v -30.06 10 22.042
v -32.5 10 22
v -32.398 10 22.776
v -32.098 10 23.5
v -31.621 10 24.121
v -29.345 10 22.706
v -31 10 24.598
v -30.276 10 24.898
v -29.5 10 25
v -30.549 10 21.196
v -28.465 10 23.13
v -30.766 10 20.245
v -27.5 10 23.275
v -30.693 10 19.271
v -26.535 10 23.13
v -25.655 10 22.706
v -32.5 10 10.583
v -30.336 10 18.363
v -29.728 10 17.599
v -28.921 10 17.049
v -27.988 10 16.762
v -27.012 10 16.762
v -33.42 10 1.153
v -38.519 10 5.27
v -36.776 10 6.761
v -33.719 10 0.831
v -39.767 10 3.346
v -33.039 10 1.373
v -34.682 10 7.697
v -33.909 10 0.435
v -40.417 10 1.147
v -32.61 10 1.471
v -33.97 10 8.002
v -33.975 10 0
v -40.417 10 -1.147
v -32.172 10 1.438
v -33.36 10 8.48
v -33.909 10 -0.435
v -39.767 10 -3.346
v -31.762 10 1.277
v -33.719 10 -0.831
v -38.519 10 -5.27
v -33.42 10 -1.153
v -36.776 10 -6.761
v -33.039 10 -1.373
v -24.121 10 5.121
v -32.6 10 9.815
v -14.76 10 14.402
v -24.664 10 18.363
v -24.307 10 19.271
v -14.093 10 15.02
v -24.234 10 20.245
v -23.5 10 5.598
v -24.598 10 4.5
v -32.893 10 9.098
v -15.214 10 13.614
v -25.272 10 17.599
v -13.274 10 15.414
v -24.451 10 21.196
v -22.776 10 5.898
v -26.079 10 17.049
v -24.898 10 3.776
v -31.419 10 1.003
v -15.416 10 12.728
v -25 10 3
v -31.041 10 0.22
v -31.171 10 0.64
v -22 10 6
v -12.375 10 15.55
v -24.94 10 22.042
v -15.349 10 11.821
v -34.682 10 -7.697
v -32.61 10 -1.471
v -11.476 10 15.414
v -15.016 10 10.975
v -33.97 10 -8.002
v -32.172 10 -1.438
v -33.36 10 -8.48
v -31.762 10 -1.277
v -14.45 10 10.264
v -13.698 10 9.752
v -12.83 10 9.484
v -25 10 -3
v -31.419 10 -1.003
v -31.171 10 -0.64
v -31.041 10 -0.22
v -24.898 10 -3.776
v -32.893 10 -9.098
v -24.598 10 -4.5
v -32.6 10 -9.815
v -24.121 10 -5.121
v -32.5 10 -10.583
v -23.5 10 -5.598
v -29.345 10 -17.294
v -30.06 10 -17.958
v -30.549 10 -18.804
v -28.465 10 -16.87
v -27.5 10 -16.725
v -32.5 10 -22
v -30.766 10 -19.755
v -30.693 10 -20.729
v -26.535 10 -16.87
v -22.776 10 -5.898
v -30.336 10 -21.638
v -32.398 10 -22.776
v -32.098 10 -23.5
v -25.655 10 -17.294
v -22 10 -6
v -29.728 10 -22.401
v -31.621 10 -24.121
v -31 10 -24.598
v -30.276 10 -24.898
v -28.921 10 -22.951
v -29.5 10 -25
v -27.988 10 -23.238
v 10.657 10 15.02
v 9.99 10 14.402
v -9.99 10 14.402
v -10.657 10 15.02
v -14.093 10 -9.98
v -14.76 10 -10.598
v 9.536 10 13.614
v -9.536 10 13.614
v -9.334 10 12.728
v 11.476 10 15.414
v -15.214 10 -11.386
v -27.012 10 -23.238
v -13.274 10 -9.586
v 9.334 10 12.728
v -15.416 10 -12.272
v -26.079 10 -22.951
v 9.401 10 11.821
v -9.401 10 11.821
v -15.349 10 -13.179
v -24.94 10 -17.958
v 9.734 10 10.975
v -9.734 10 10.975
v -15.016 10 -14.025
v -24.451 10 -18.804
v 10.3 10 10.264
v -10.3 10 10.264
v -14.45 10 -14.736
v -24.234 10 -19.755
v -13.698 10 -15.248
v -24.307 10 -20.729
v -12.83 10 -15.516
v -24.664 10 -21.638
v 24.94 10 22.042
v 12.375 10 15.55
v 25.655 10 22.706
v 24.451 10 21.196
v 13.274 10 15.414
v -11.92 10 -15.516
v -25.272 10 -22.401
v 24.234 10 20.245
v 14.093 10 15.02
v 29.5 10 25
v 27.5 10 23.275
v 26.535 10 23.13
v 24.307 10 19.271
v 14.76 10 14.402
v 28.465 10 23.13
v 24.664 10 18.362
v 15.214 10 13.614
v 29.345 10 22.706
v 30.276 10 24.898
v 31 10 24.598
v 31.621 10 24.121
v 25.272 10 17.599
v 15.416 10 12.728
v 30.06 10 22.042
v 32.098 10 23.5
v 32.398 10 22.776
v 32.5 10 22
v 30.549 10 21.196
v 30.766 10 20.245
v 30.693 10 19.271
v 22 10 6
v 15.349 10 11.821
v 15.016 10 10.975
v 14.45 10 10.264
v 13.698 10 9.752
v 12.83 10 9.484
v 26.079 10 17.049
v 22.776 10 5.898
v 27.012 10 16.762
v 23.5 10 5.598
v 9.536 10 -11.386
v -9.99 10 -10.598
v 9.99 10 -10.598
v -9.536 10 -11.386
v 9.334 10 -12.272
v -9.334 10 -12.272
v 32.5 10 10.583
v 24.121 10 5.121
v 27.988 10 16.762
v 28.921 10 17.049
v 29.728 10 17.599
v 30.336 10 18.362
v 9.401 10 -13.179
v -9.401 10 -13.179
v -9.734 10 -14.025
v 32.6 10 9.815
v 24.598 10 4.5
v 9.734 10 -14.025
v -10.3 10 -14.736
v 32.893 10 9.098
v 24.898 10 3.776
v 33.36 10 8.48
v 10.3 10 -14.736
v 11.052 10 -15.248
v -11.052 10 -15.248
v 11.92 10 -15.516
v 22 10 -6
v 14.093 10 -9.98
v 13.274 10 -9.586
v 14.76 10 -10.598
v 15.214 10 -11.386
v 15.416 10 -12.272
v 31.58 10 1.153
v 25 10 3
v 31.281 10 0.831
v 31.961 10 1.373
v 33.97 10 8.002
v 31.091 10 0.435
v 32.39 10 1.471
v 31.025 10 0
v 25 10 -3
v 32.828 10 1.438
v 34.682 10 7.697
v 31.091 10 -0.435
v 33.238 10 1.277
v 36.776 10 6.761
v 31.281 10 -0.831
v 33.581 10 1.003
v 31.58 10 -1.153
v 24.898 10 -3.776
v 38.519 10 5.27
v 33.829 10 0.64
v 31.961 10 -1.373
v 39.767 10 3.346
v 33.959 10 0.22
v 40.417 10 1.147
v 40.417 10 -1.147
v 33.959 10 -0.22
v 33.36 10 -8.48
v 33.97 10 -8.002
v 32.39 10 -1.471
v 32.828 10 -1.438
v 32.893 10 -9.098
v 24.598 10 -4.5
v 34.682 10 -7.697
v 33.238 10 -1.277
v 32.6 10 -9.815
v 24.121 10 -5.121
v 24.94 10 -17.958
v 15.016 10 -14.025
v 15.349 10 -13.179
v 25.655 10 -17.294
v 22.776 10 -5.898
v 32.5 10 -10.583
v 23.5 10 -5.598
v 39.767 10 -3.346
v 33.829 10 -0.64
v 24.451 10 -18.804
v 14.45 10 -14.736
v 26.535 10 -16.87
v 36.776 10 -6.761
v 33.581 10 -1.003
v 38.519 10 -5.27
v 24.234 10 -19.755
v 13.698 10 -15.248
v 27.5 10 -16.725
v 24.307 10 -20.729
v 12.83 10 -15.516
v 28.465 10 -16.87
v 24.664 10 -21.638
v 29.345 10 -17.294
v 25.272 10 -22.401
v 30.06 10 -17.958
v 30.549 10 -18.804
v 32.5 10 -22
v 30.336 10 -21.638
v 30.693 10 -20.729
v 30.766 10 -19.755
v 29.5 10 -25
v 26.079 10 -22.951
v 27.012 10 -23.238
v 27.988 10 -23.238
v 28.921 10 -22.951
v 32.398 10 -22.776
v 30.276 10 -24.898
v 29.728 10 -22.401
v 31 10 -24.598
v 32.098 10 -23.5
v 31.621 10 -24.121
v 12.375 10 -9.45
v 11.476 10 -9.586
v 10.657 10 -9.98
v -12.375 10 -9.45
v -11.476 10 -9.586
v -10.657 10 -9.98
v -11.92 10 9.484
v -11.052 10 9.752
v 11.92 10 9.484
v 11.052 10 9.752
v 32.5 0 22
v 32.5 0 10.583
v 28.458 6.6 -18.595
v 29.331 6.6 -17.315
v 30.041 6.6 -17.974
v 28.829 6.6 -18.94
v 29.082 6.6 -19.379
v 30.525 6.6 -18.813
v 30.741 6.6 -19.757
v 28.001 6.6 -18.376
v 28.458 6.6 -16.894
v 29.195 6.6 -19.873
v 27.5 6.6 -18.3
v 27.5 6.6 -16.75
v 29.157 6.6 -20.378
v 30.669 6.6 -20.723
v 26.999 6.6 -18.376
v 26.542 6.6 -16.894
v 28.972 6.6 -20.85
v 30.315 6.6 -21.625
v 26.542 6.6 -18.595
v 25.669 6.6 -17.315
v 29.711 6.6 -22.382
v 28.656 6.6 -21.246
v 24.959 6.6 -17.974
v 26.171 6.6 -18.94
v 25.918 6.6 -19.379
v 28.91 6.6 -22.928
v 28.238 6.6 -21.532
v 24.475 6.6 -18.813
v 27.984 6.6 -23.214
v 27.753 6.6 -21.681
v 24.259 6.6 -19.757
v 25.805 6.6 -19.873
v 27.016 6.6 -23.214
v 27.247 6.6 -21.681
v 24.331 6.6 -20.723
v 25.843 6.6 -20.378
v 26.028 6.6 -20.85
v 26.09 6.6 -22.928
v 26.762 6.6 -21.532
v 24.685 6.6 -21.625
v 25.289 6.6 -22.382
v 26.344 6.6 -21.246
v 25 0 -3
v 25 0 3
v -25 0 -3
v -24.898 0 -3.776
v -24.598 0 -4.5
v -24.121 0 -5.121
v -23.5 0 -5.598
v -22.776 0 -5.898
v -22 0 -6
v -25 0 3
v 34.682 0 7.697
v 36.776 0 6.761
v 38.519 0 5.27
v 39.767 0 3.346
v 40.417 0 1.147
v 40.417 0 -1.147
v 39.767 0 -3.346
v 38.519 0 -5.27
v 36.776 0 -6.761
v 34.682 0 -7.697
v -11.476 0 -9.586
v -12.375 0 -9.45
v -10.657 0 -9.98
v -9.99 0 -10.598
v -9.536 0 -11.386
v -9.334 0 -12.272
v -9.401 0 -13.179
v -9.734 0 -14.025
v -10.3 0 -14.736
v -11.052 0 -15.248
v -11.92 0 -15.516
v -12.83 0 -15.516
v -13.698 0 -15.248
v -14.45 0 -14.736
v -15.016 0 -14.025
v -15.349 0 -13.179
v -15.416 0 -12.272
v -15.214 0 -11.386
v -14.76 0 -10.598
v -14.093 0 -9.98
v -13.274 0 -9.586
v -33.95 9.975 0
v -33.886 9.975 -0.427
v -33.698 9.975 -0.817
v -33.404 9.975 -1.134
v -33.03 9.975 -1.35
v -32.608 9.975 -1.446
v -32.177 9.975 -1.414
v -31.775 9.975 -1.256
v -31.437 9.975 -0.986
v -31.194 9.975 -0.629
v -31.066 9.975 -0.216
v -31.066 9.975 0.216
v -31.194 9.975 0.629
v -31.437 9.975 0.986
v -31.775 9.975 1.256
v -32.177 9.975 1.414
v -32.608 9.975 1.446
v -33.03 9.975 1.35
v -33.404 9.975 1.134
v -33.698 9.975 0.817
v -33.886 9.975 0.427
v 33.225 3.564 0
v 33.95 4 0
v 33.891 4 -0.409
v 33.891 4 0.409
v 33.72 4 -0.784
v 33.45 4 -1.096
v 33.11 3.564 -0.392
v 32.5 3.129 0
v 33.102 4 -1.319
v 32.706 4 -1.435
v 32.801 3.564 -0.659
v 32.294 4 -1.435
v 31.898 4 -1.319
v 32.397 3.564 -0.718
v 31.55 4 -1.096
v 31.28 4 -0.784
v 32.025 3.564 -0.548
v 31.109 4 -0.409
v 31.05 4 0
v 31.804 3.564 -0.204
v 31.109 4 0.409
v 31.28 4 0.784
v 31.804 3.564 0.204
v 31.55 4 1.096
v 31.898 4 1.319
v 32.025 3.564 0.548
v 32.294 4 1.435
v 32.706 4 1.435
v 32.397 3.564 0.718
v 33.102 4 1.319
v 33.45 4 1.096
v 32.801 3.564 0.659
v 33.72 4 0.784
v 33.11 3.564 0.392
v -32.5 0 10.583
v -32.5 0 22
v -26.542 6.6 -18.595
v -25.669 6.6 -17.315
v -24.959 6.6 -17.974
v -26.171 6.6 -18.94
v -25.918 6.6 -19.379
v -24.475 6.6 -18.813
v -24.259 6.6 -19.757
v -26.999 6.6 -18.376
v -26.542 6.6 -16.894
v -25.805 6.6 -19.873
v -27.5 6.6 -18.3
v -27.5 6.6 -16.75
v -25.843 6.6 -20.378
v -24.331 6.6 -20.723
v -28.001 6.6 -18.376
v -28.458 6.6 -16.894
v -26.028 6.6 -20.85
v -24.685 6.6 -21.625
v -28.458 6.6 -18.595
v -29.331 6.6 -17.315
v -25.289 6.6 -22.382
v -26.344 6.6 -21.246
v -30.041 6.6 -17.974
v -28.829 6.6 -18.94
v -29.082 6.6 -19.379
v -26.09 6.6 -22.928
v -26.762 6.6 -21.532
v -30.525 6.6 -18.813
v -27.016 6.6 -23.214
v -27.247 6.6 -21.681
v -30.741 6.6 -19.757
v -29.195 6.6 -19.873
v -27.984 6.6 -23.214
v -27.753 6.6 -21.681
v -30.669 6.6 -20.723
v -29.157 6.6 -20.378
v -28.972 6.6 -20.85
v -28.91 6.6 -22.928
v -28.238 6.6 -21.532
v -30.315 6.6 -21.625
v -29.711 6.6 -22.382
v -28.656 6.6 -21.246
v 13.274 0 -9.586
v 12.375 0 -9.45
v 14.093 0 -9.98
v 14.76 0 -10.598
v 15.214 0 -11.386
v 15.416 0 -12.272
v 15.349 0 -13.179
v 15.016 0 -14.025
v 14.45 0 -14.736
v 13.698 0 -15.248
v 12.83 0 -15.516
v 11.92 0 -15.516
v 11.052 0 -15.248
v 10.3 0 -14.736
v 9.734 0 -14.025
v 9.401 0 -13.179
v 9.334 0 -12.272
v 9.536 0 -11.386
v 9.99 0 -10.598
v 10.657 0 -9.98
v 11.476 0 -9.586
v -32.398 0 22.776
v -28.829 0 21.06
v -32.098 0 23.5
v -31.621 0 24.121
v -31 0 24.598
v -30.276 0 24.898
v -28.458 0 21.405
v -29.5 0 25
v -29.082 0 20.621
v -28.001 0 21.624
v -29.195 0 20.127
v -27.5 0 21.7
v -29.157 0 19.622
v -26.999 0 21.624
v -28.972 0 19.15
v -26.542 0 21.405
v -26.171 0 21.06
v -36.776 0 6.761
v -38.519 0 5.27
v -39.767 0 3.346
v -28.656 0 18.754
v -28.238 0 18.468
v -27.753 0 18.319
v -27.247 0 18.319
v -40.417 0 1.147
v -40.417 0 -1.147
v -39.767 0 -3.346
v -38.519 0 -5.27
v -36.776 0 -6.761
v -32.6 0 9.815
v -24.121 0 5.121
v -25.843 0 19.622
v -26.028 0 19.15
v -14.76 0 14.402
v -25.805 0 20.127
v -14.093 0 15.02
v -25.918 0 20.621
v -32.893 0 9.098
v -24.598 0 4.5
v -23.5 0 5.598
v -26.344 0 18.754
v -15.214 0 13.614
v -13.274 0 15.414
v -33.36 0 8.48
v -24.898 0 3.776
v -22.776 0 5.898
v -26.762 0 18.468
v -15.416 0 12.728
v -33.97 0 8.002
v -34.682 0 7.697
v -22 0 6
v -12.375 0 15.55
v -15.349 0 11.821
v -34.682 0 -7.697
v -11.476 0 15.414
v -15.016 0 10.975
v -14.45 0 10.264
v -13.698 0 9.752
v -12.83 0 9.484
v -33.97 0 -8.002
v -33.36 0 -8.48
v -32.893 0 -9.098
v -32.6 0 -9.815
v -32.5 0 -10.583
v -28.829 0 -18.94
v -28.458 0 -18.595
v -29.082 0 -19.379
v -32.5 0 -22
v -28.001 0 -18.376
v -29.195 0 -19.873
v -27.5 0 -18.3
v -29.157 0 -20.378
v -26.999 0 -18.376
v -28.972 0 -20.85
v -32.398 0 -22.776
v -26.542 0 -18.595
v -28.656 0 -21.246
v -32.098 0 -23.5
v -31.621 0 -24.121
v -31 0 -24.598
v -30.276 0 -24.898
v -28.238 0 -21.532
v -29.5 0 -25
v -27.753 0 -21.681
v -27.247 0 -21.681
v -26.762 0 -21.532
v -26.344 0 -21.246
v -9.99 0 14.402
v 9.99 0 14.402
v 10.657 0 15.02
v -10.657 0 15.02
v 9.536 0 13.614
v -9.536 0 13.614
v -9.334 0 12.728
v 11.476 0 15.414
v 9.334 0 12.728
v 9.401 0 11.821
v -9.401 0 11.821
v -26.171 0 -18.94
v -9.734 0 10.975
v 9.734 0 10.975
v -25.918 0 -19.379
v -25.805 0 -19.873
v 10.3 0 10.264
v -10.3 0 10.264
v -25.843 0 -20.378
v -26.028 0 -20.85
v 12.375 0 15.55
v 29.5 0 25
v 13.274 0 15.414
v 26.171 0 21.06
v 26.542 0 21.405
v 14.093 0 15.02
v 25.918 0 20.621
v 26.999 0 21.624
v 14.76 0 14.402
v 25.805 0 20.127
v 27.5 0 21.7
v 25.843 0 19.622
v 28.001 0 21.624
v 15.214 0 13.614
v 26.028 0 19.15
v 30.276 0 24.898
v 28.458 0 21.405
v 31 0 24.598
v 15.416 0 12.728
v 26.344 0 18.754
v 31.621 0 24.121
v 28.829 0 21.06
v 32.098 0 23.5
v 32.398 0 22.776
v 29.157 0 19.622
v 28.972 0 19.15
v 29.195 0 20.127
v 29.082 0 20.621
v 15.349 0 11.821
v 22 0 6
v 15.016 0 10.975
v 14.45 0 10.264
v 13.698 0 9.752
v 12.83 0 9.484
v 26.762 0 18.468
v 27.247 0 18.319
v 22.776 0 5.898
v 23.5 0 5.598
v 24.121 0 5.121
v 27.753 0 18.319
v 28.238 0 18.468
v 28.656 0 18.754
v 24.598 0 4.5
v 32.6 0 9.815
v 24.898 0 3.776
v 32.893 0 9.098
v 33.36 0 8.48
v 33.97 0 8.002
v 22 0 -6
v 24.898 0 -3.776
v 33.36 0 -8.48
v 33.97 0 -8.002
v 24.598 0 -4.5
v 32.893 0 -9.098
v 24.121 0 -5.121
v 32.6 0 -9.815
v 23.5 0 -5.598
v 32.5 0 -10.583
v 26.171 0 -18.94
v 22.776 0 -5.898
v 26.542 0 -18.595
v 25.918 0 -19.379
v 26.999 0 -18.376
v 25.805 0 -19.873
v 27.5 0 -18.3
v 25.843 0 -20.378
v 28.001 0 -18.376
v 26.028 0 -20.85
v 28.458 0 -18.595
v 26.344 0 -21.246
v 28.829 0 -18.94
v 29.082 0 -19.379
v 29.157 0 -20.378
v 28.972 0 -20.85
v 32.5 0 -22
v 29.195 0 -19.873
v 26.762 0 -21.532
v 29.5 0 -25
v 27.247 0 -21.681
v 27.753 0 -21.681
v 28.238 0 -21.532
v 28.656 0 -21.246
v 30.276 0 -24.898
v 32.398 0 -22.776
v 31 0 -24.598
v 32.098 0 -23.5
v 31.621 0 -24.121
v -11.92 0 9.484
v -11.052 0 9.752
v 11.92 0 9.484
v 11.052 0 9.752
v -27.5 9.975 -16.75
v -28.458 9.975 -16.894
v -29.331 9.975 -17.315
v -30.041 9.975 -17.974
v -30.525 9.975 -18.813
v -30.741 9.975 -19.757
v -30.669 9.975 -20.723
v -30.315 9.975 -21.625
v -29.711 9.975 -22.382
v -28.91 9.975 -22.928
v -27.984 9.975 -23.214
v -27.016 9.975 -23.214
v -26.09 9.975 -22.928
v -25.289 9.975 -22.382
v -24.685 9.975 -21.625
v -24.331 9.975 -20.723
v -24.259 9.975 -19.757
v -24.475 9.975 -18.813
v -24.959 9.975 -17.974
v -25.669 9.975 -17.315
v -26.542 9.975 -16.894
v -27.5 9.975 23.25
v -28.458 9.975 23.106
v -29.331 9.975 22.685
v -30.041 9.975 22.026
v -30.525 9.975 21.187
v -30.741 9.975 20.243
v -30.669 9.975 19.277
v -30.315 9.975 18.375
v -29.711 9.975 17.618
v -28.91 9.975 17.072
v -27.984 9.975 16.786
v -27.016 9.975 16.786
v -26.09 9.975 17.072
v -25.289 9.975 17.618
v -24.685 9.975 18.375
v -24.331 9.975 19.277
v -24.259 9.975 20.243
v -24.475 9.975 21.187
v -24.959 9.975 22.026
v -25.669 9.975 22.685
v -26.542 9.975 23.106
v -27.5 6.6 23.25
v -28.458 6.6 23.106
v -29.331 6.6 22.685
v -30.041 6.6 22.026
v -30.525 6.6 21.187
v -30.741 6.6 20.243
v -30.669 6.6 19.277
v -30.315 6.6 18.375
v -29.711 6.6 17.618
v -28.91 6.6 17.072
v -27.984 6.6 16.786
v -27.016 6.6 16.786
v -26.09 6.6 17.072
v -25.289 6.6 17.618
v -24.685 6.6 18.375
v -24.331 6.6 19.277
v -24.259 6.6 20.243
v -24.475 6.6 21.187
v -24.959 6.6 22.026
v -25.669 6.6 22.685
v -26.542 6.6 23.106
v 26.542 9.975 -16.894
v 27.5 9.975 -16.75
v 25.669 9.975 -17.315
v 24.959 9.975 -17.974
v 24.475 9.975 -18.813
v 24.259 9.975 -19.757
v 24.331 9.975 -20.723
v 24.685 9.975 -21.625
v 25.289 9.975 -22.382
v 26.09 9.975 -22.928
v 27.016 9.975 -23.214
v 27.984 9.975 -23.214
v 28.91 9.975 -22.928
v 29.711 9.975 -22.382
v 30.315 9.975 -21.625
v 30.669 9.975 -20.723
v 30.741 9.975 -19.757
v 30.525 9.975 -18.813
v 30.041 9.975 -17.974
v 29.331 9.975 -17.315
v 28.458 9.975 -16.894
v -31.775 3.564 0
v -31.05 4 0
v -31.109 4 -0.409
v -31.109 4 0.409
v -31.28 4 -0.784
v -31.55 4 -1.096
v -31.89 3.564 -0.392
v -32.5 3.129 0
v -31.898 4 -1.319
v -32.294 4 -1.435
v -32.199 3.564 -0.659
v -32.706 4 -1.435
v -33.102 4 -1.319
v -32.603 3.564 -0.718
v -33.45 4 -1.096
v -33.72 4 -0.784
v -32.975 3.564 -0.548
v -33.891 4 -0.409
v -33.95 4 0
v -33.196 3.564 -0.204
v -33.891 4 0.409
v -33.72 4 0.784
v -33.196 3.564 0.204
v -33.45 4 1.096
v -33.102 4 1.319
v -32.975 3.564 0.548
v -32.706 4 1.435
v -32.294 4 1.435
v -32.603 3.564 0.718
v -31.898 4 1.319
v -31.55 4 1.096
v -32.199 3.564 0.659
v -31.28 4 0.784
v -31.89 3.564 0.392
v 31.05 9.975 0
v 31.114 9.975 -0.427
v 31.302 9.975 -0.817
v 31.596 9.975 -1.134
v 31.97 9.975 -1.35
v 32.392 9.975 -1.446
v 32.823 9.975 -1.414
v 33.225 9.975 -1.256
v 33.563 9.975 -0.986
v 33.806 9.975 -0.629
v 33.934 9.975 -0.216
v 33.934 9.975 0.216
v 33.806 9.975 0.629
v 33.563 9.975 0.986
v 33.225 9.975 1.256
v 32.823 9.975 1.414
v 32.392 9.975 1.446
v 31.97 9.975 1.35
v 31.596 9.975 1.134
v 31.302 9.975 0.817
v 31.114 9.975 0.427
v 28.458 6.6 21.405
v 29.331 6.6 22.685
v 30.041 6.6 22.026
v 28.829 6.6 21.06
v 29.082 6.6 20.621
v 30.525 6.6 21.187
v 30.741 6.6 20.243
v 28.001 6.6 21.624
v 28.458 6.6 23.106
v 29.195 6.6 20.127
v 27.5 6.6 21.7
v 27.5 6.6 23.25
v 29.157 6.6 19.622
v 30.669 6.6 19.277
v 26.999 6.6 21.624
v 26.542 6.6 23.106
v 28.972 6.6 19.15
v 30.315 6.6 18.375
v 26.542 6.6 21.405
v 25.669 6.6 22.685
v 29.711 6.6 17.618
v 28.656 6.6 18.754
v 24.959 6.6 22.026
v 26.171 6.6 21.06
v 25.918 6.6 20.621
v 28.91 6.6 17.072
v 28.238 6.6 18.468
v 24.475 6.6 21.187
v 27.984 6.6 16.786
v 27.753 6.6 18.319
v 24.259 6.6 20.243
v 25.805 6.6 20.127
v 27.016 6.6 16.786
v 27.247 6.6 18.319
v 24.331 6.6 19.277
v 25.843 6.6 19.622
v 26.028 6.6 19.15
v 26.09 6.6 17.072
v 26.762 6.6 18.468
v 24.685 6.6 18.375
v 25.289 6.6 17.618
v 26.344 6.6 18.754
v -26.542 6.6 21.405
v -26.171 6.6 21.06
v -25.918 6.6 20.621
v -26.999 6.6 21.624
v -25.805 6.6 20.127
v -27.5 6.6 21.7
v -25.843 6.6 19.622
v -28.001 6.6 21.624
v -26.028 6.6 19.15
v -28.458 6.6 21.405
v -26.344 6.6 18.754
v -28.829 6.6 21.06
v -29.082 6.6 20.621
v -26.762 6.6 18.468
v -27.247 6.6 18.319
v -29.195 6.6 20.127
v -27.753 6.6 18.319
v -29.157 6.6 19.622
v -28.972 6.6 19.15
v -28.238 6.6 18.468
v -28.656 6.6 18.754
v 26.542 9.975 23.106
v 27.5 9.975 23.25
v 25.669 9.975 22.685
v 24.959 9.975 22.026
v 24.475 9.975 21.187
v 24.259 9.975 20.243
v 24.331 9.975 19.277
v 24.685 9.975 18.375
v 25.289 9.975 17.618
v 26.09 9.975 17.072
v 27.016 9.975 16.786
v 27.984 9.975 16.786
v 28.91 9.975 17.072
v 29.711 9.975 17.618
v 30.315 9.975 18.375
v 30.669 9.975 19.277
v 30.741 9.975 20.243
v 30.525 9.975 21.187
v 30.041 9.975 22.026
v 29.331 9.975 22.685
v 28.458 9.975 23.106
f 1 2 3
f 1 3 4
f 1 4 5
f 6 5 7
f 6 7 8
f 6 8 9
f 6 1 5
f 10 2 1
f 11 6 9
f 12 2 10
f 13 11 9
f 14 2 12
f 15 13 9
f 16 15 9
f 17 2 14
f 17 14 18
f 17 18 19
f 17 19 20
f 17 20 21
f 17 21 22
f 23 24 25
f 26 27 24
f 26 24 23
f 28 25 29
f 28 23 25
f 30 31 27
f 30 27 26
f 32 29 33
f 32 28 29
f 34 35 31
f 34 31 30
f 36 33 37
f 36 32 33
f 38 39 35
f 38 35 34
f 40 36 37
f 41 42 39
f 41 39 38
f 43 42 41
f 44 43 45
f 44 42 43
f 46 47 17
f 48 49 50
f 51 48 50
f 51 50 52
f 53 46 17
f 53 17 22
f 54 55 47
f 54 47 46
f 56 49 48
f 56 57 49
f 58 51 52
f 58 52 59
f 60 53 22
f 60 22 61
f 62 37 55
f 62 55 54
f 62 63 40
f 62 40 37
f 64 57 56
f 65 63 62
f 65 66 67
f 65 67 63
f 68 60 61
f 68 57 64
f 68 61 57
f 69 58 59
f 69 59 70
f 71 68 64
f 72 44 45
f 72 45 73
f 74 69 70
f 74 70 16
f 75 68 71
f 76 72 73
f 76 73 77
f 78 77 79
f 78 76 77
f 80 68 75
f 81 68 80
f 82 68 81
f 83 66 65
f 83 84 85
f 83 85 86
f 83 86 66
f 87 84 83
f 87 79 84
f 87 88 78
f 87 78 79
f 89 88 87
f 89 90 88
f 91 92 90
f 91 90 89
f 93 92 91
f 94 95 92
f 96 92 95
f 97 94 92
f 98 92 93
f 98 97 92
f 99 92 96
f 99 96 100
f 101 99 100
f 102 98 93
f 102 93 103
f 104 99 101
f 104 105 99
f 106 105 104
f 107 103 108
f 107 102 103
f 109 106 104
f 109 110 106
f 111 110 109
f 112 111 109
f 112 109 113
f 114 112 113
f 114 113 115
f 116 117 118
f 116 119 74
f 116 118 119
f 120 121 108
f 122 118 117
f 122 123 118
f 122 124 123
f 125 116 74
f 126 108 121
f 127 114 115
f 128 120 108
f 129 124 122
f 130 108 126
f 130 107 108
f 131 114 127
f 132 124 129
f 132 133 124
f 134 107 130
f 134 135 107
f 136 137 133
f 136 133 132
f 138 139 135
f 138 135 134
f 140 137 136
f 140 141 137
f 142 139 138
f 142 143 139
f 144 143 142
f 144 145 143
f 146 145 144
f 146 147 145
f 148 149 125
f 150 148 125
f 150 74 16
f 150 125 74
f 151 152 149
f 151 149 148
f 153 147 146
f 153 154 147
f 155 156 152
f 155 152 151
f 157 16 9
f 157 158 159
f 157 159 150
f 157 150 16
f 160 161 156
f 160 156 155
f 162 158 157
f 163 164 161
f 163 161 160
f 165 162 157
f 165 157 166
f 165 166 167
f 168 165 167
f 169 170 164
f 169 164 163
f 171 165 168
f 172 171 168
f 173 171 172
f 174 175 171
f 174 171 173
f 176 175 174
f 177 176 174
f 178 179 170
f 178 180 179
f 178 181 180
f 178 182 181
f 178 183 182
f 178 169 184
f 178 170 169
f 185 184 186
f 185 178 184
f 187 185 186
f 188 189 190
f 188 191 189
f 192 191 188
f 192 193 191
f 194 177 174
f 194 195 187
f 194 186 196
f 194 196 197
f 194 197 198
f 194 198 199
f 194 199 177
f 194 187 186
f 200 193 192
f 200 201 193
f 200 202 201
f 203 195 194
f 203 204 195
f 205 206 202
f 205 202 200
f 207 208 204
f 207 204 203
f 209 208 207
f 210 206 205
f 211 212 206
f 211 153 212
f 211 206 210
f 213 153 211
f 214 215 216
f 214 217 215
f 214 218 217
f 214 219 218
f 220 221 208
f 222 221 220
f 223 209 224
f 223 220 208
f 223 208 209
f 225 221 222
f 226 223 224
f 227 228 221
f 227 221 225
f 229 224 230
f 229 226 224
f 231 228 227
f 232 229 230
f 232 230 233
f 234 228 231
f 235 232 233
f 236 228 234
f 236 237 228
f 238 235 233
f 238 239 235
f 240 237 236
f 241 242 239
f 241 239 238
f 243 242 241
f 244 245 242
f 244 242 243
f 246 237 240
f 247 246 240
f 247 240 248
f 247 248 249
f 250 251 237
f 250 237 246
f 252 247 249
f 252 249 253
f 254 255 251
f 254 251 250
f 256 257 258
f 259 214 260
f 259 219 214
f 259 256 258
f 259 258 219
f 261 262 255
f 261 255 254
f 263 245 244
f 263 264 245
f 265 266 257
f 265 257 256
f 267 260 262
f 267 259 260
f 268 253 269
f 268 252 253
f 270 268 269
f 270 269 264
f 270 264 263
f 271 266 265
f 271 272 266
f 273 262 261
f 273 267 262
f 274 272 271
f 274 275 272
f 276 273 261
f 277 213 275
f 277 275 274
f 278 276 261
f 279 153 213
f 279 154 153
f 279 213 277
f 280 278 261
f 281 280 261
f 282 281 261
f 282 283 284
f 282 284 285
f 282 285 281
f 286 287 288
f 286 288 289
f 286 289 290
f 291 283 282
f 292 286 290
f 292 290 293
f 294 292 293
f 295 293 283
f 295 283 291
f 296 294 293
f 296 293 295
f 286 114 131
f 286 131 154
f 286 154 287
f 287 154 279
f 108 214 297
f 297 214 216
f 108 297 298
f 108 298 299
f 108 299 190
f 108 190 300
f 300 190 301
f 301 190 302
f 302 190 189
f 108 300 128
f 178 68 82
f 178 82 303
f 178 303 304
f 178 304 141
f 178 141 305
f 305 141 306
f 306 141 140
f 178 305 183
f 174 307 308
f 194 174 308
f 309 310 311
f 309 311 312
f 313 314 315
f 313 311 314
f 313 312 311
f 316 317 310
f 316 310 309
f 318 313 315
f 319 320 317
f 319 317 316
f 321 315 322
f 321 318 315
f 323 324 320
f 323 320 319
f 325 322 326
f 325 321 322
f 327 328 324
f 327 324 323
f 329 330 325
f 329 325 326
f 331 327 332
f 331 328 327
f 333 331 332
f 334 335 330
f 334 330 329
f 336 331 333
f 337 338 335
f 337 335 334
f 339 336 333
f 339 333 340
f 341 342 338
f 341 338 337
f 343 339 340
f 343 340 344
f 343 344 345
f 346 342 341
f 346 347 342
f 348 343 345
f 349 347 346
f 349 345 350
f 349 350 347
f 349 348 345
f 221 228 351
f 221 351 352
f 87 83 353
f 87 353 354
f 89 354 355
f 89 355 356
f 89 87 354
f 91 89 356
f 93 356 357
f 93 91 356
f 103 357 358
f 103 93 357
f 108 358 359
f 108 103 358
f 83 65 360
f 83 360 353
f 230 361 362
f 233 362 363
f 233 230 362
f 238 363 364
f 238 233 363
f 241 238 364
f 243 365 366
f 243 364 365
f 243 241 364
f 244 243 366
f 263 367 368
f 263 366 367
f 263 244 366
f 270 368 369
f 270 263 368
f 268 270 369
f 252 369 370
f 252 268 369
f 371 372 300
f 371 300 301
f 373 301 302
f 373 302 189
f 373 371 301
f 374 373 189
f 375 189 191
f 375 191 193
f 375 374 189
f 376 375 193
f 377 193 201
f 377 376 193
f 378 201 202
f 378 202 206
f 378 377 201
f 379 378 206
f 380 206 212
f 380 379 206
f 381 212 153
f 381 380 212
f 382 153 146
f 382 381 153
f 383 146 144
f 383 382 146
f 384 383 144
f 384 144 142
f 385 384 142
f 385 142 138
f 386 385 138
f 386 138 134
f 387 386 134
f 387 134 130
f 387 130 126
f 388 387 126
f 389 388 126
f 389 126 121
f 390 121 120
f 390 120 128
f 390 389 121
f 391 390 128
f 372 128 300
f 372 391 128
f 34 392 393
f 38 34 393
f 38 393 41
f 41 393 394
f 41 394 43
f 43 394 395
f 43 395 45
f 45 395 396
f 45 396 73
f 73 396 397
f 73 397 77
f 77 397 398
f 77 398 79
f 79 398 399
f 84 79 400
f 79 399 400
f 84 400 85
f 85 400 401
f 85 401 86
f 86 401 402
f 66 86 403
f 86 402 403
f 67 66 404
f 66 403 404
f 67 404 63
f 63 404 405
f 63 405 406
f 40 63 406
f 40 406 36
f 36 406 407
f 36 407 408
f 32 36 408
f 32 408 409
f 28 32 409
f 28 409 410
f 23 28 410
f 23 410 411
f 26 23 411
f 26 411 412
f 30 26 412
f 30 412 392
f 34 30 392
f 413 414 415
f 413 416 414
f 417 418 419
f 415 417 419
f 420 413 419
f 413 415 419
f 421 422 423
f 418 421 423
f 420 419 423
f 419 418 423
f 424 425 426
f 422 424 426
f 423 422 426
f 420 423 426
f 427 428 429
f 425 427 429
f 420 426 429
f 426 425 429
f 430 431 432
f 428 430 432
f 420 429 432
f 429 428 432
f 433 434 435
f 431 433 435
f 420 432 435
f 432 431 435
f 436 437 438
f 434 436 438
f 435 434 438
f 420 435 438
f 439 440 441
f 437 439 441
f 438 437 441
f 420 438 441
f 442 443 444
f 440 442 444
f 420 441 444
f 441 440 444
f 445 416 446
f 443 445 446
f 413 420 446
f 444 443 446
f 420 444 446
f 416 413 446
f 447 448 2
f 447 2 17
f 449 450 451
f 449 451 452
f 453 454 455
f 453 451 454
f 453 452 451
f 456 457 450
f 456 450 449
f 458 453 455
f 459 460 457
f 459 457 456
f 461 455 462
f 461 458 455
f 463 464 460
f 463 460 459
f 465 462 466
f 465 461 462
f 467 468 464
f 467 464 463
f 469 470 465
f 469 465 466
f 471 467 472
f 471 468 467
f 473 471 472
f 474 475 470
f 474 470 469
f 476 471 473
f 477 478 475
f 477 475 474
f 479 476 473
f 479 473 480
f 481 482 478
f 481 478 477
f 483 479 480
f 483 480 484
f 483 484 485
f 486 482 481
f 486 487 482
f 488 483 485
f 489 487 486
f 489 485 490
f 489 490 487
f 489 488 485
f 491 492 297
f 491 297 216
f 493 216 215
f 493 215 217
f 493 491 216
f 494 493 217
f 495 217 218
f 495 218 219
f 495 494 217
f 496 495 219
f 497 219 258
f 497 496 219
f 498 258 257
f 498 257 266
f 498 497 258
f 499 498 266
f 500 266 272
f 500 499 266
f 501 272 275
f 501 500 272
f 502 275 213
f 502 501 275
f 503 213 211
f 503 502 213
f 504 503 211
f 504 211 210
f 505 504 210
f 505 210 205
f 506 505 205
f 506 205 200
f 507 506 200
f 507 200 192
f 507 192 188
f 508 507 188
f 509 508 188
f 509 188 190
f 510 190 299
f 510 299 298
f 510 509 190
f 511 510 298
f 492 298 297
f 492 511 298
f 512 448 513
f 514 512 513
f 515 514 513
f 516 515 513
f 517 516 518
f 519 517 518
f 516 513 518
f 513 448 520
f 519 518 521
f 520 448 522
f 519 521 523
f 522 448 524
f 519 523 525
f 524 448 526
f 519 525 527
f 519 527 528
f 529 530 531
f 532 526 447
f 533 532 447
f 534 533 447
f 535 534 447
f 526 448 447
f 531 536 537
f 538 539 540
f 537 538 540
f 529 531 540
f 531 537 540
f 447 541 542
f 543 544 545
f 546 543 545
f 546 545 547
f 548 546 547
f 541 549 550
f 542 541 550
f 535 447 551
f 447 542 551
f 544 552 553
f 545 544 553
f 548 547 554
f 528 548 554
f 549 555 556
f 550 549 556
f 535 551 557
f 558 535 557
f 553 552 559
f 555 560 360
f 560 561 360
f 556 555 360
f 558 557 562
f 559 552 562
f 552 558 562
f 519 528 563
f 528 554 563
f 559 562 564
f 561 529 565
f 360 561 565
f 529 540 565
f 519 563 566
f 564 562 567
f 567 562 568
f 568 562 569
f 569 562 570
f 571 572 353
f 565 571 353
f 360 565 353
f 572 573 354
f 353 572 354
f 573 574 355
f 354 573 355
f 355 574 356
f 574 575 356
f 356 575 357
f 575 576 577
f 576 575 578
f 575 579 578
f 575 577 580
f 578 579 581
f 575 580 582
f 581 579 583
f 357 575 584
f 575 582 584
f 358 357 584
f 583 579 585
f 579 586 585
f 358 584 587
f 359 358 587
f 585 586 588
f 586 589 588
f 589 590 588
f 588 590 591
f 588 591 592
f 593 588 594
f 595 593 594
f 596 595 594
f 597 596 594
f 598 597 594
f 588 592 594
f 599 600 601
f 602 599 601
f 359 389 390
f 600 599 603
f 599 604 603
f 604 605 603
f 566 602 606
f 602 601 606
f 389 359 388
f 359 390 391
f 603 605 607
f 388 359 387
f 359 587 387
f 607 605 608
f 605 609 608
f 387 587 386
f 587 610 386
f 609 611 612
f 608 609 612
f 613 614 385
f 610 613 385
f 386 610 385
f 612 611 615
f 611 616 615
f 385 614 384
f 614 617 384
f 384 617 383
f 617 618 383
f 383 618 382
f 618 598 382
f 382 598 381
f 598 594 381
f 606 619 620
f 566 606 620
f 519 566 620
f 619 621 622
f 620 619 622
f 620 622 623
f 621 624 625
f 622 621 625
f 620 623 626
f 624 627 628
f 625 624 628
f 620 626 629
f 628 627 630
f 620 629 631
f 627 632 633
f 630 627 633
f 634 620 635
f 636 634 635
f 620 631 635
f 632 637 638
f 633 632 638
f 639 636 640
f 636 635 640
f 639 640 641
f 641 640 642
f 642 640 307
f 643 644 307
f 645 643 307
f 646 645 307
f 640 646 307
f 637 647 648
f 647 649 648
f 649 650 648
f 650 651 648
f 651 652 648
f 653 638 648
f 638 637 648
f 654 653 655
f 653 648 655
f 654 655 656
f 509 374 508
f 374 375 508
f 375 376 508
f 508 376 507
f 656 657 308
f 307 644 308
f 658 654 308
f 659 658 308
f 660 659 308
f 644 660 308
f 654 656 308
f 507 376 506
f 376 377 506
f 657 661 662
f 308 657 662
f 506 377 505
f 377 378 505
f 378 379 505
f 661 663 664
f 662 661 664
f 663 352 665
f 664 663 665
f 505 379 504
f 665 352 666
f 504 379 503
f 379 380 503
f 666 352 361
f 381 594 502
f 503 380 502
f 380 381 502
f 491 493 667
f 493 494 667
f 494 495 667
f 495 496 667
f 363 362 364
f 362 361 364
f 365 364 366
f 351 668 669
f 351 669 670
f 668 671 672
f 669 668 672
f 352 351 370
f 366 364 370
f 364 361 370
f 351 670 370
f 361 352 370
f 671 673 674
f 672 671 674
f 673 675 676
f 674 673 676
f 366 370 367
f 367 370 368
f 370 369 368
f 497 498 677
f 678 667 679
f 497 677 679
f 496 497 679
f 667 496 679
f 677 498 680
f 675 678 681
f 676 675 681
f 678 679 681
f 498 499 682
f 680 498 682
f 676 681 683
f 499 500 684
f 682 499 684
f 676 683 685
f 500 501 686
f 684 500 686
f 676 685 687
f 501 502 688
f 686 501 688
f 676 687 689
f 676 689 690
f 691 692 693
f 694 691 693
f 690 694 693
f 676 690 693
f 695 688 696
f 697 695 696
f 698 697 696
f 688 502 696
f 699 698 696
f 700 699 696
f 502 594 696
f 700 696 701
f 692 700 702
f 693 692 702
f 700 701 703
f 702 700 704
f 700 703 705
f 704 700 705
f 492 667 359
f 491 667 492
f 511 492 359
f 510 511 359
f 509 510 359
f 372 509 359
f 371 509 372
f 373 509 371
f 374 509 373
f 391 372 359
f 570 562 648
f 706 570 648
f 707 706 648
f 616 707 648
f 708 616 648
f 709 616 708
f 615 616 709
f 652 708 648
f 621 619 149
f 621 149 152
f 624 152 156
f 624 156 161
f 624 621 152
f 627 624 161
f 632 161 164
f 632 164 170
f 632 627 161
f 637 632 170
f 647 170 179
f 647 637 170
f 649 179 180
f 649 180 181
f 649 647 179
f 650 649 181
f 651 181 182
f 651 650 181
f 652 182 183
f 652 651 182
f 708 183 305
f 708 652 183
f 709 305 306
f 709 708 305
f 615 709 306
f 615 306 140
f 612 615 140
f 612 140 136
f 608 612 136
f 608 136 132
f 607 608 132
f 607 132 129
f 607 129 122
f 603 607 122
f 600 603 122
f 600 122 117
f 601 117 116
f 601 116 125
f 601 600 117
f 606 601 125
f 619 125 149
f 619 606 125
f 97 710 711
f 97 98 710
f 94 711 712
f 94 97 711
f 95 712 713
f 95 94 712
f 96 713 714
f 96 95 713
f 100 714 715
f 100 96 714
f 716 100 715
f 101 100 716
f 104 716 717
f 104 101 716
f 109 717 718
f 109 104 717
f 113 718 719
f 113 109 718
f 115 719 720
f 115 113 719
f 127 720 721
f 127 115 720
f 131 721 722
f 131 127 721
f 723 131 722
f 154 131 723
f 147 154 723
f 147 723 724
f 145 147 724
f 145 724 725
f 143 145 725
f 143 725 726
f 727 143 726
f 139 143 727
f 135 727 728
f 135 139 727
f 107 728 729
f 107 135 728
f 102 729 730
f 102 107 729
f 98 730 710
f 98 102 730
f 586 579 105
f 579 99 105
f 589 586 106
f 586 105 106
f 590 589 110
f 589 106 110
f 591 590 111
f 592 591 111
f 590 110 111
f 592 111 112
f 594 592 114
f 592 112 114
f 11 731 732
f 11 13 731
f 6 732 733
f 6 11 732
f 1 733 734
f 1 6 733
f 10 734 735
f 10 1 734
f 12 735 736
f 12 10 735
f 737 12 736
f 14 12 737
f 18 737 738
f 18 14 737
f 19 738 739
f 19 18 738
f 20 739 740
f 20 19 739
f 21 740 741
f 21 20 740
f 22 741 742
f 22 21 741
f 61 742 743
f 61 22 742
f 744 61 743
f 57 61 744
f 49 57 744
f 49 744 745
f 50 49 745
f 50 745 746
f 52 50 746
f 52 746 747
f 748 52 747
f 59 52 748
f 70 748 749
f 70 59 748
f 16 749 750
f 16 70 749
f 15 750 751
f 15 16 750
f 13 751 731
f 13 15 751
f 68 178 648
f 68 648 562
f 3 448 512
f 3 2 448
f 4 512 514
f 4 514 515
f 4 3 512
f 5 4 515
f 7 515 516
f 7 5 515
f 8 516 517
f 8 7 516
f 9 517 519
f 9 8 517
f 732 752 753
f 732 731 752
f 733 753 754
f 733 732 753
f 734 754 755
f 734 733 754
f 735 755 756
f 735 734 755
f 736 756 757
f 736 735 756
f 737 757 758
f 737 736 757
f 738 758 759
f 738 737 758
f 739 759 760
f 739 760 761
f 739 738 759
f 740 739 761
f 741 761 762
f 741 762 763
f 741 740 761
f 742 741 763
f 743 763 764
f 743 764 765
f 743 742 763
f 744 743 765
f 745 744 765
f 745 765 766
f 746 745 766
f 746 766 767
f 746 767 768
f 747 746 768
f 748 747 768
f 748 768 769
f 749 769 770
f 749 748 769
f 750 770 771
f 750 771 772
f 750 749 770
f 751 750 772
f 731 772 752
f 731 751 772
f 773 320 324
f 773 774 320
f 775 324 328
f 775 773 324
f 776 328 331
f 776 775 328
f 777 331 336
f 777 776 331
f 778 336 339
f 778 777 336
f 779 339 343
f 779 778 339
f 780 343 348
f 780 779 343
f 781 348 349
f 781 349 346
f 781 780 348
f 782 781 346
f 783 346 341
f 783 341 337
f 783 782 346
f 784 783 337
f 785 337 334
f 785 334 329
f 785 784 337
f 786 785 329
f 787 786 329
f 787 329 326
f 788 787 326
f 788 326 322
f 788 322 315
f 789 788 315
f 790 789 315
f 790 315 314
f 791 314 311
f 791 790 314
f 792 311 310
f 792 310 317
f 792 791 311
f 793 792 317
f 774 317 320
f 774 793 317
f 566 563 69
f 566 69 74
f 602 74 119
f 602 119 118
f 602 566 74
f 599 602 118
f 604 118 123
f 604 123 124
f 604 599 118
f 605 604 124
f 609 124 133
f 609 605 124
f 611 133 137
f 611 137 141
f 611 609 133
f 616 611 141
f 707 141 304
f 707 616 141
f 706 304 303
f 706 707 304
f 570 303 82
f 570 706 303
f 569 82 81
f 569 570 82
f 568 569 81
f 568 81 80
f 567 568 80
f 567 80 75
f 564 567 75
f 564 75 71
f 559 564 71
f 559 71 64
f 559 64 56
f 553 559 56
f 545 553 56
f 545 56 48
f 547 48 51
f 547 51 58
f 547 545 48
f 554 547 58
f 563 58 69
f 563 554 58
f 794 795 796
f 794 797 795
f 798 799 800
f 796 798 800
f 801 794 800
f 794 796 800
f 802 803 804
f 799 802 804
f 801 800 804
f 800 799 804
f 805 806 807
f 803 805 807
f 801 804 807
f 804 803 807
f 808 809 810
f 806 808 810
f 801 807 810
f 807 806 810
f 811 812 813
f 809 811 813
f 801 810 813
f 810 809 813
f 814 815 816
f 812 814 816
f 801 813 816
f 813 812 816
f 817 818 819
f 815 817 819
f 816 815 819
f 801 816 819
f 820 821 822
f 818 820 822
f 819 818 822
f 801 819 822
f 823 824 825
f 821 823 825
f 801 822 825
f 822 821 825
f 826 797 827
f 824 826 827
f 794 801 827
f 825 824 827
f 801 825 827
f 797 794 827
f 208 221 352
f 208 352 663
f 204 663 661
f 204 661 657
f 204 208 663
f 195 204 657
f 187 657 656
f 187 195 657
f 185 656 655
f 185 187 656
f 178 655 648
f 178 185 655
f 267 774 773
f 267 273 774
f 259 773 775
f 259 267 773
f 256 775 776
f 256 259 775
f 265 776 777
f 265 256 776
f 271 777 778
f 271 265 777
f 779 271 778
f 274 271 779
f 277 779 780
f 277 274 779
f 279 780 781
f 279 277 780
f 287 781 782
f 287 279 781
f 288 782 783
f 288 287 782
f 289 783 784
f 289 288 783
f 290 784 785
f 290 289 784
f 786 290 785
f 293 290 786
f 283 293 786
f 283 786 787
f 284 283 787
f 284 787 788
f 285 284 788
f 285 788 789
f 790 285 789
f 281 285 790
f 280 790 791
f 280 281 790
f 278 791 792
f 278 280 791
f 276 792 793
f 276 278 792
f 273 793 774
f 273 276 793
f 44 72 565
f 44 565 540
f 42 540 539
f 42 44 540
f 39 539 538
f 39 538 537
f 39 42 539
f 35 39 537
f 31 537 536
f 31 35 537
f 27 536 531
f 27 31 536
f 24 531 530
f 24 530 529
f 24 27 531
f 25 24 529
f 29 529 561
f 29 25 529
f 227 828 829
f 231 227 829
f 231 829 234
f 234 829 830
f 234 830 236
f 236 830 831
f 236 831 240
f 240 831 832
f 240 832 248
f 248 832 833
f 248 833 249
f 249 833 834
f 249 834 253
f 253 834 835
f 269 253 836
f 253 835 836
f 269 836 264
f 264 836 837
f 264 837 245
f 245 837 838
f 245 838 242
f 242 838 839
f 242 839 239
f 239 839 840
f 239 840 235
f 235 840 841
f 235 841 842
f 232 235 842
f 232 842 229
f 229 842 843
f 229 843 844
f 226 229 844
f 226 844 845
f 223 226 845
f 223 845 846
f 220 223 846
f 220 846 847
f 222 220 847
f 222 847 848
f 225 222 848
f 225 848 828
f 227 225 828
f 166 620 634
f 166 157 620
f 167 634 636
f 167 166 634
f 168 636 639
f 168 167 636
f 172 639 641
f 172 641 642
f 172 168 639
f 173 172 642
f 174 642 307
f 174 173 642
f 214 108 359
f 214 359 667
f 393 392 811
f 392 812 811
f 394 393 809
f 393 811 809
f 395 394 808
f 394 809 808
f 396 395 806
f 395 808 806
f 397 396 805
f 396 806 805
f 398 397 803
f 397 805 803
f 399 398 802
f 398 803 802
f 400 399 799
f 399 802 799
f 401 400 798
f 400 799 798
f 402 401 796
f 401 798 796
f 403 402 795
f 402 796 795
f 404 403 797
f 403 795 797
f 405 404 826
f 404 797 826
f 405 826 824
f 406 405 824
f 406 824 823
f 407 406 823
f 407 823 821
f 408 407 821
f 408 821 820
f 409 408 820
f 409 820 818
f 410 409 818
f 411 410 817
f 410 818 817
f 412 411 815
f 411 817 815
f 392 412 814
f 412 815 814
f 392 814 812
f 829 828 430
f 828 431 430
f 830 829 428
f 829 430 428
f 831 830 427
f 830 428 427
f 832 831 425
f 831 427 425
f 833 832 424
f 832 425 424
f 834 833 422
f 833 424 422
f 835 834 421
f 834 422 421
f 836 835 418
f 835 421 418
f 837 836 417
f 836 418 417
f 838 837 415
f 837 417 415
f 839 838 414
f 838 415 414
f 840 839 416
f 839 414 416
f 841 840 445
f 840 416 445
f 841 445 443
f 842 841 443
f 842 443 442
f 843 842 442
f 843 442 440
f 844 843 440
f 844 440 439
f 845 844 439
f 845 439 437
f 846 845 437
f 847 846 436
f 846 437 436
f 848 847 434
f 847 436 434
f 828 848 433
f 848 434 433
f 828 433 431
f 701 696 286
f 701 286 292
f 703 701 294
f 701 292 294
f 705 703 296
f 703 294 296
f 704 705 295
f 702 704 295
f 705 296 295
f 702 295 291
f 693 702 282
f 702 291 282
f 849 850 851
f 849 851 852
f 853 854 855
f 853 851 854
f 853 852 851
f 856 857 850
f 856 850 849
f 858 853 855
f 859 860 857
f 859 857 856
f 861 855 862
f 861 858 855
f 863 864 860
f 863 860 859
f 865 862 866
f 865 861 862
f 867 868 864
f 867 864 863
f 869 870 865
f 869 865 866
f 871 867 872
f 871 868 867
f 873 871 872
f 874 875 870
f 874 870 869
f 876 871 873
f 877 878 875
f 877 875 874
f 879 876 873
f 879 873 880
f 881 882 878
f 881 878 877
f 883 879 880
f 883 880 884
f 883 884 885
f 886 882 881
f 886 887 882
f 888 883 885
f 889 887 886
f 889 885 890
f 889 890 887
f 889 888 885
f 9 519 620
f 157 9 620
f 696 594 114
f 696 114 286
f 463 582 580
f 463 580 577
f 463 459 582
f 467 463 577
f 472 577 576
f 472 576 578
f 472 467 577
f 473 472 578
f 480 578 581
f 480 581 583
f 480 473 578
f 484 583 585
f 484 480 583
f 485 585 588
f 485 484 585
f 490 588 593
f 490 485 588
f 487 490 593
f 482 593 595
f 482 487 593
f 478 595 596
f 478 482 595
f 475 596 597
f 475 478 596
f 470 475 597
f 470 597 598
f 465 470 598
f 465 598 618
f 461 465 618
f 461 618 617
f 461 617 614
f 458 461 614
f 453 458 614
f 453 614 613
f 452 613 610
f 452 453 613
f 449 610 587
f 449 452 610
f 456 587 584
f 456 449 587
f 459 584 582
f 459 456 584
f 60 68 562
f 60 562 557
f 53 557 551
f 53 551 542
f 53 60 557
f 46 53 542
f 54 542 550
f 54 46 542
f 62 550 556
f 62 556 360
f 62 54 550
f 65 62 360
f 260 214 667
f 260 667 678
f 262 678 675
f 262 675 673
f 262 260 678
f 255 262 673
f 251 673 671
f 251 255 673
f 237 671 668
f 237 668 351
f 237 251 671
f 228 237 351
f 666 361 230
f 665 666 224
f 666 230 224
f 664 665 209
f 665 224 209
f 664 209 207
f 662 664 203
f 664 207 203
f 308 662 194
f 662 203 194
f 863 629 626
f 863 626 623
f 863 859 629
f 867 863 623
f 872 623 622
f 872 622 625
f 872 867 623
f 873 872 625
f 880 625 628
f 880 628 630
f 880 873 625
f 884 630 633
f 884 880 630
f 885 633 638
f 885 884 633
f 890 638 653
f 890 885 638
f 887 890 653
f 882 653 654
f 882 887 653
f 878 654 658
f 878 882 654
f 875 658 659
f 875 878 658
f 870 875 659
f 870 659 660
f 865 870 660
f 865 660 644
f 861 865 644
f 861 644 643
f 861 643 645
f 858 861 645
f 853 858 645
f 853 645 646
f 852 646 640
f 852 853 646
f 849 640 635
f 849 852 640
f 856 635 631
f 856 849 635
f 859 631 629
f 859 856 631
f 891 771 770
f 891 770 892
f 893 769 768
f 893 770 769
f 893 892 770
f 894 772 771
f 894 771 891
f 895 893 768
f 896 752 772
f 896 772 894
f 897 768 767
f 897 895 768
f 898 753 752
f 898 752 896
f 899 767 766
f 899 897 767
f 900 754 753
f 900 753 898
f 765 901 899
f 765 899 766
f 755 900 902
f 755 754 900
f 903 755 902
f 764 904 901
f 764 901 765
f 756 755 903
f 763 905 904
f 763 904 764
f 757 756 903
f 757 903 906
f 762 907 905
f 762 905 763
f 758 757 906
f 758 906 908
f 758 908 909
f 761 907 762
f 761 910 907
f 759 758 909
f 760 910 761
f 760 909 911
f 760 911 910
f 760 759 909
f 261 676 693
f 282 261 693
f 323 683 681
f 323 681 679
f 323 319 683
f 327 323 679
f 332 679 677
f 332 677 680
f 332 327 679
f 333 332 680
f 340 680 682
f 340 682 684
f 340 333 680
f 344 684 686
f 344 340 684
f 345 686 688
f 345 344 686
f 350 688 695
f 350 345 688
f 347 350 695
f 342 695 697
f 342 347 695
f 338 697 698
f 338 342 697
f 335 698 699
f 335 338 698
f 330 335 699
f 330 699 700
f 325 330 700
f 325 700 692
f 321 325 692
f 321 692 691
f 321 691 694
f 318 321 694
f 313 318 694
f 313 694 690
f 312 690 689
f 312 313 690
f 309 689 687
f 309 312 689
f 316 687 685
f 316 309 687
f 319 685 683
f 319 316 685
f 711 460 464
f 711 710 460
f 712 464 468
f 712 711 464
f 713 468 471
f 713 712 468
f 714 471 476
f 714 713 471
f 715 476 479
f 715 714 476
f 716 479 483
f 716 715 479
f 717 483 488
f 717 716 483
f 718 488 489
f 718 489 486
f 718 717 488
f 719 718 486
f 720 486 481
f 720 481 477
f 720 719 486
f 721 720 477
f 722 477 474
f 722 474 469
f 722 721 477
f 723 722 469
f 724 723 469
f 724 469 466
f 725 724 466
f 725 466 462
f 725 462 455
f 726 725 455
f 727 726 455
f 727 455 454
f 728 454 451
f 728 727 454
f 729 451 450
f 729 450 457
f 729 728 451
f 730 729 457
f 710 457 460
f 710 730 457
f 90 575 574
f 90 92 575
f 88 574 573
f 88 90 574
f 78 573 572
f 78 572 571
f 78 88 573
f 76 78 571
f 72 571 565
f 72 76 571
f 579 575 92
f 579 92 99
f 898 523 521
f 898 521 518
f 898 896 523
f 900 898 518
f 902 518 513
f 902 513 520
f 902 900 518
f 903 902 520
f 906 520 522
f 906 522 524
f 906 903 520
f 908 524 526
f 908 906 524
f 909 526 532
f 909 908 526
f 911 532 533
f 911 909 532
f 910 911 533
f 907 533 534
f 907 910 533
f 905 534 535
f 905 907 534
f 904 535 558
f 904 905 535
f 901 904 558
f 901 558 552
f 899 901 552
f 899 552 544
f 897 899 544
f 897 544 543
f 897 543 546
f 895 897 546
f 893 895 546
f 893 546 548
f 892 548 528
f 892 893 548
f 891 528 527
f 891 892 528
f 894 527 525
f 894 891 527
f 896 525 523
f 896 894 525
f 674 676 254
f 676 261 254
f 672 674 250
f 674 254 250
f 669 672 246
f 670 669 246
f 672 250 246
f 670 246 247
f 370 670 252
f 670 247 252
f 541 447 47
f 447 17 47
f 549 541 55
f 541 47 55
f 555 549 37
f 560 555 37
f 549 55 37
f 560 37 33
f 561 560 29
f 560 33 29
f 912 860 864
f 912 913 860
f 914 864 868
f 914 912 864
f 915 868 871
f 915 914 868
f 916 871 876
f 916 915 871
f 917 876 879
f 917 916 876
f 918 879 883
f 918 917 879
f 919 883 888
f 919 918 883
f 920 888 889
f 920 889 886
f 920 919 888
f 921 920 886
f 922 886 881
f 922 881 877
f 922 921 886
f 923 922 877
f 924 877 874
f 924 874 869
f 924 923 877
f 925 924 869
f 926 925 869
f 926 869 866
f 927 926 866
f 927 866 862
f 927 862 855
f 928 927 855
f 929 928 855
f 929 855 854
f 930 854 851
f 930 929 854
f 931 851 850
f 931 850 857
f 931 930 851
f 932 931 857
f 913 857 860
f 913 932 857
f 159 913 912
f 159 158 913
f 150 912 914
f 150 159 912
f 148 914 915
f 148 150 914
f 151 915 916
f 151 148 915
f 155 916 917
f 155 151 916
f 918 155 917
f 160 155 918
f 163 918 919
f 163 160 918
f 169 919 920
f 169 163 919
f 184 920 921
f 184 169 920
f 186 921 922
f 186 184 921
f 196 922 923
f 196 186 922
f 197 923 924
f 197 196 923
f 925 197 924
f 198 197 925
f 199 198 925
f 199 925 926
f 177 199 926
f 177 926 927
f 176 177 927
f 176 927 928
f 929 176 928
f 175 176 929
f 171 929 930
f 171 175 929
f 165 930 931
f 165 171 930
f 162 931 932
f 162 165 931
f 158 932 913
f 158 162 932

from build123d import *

# Parameters (mm, degrees)
SKETCH1_W                                    = 65
SKETCH1_H                                    = 50
SKETCH1_R                                    = 3.05
BOSS_EXTRUDE1_DEPTH                          = 10
FILLET1_R                                    = 3
CBORE_FOR_M3_HEX_SOCKET_HEAD_CAP_SCR_2_COUNT = 2
CBORE_FOR_M3_HEX_SOCKET_HEAD_CAP_SCR_2_PITCH = 55
CBORE_FOR_M3_HEX_SOCKET_HEAD_CAP_SCR_3_COUNT = 2
CBORE_FOR_M3_HEX_SOCKET_HEAD_CAP_SCR_3_PITCH = 68.007352544
CBORE_FOR_M3_HEX_SOCKET_HEAD_CAP_SCR_4_COUNT = 2
CBORE_FOR_M3_HEX_SOCKET_HEAD_CAP_SCR_4_PITCH = 40
SKETCH6_R                                    = 8
BOSS_EXTRUDE2_DEPTH                          = 10
FILLET2_R                                    = 3
F_2_9_2_9_DIAMETER_HOLE1_D                   = 2.9
F_2_9_2_9_DIAMETER_HOLE1_DEPTH               = 6
F_2_9_2_9_DIAMETER_HOLE1_CSINK_D             = 2.95
F_2_9_2_9_DIAMETER_HOLE1_CSINK_ANGLE         = 90
F_2_9_2_9_DIAMETER_HOLE1_TIP                 = 0.871247898
CUT_EXTRUDE1_DEPTH                           = 10


with BuildPart() as part:
    # Sketch1 → Boss-Extrude1 (new body)
    with BuildSketch(Plane(origin=(0, 0, 0), x_dir=(1, 0, 0), z_dir=(0, 1, 0))):
        Rectangle(SKETCH1_W, SKETCH1_H)
        with Locations(Location((-12.375, 12.5, 0), (0, 0, 270))):
            Circle(SKETCH1_R, mode=Mode.SUBTRACT)
        with Locations(Location((-12.375, -12.5, 0), (0, 0, 270))):
            Circle(SKETCH1_R, mode=Mode.SUBTRACT)
        with Locations(Location((12.375, 12.5, 0), (0, 0, 270))):
            Circle(SKETCH1_R, mode=Mode.SUBTRACT)
        with Locations(Location((12.375, -12.5, 0), (0, 0, 270))):
            Circle(SKETCH1_R, mode=Mode.SUBTRACT)
    extrude(amount=BOSS_EXTRUDE1_DEPTH)

    # Fillet1
    fillet1_edges = [part.edges().sort_by_distance(p)[0] for p in [
        (32.5, 5, 25),
        (-32.5, 5, 25),
        (-32.5, 5, -25),
        (32.5, 5, -25),
    ]]
    fillet(fillet1_edges, radius=FILLET1_R)

    # Sketch3 → CBORE for M3 Hex Socket Head Cap Screw1 (revolve, cut)
    with BuildSketch(Plane(origin=(27.5, 10, -20), x_dir=(0, 0, 1), z_dir=(1, 0, 0))):
        Polygon((0, 0), (0, 10), (1.7, 10), (1.7, 3.4), (3.25, 3.4), (3.25, 0.025), (3.275, 0), align=None)
    cbore_for_m3_hex_socket_head_cap_screw1 = revolve(axis=Axis((27.5, 16.35, -20), (0, -1, 0)), mode=Mode.SUBTRACT)

    # CBORE for M3 Hex Socket Head Cap Scr 2: CBORE for M3 Hex Socket Head Cap Screw1 ×2
    with Locations(*[(-i * CBORE_FOR_M3_HEX_SOCKET_HEAD_CAP_SCR_2_PITCH, 0, 0) for i in range(1, CBORE_FOR_M3_HEX_SOCKET_HEAD_CAP_SCR_2_COUNT)]):
        add(cbore_for_m3_hex_socket_head_cap_screw1, mode=Mode.SUBTRACT)

    # CBORE for M3 Hex Socket Head Cap Scr 3: CBORE for M3 Hex Socket Head Cap Screw1 ×2
    with Locations(*[Vector(-0.8087360843031886, 0, 0.5881716976750463) * (i * CBORE_FOR_M3_HEX_SOCKET_HEAD_CAP_SCR_3_PITCH) for i in range(1, CBORE_FOR_M3_HEX_SOCKET_HEAD_CAP_SCR_3_COUNT)]):
        add(cbore_for_m3_hex_socket_head_cap_screw1, mode=Mode.SUBTRACT)

    # CBORE for M3 Hex Socket Head Cap Scr 4: CBORE for M3 Hex Socket Head Cap Screw1 ×2
    with Locations(*[(0, 0, i * CBORE_FOR_M3_HEX_SOCKET_HEAD_CAP_SCR_4_PITCH) for i in range(1, CBORE_FOR_M3_HEX_SOCKET_HEAD_CAP_SCR_4_COUNT)]):
        add(cbore_for_m3_hex_socket_head_cap_screw1, mode=Mode.SUBTRACT)

    # Sketch6 → Boss-Extrude2 (add)
    with BuildSketch(Plane(origin=(0, 10, 0), x_dir=(1, 0, 0), z_dir=(0, 1, 0))):
        with Locations((-32.5, 0)):
            Circle(SKETCH6_R)
        with Locations((32.5, 0)):
            Circle(SKETCH6_R)
    extrude(amount=-BOSS_EXTRUDE2_DEPTH)

    # Fillet2
    fillet2_edges = [part.edges().sort_by_distance(p)[0] for p in [
        (32.5, 5, -8),
        (32.5, 5, 8),
        (-32.5, 5, 8),
        (-32.5, 5, -8),
    ]]
    fillet(fillet2_edges, radius=FILLET2_R)

    # Ø2.9 (2.9) Diameter Hole1
    with Locations(Plane(origin=(0, 10, 0), x_dir=(1, 0, 0), z_dir=(0, 1, 0))):
        with Locations((-32.5, 0), (32.5, 0)):
            CounterSinkHole(F_2_9_2_9_DIAMETER_HOLE1_D / 2, F_2_9_2_9_DIAMETER_HOLE1_CSINK_D / 2, depth=F_2_9_2_9_DIAMETER_HOLE1_DEPTH, counter_sink_angle=F_2_9_2_9_DIAMETER_HOLE1_CSINK_ANGLE)
            with Locations((0, 0, -(F_2_9_2_9_DIAMETER_HOLE1_DEPTH + F_2_9_2_9_DIAMETER_HOLE1_TIP / 2))):  # 118° drill point
                Cone(0, F_2_9_2_9_DIAMETER_HOLE1_D / 2, F_2_9_2_9_DIAMETER_HOLE1_TIP, mode=Mode.SUBTRACT)

    # Sketch9 → Cut-Extrude1 (cut)
    with BuildSketch(Plane(origin=(0, 10, 0), x_dir=(1, 0, 0), z_dir=(0, 1, 0))):
        with BuildLine():
            Line((-22, 6), (22, 6))
            ThreePointArc((22, 6), (24.121320344, 5.121320344), (25, 3))
            Line((25, 3), (25, -3))
            ThreePointArc((25, -3), (24.121320344, -5.121320344), (22, -6))
            Line((22, -6), (-22, -6))
            ThreePointArc((-22, -6), (-24.121320344, -5.121320344), (-25, -3))
            Line((-25, -3), (-25, 3))
            ThreePointArc((-25, 3), (-24.121320344, 5.121320344), (-22, 6))
        make_face()
    extrude(amount=-CUT_EXTRUDE1_DEPTH, mode=Mode.SUBTRACT)


solid = part.part
